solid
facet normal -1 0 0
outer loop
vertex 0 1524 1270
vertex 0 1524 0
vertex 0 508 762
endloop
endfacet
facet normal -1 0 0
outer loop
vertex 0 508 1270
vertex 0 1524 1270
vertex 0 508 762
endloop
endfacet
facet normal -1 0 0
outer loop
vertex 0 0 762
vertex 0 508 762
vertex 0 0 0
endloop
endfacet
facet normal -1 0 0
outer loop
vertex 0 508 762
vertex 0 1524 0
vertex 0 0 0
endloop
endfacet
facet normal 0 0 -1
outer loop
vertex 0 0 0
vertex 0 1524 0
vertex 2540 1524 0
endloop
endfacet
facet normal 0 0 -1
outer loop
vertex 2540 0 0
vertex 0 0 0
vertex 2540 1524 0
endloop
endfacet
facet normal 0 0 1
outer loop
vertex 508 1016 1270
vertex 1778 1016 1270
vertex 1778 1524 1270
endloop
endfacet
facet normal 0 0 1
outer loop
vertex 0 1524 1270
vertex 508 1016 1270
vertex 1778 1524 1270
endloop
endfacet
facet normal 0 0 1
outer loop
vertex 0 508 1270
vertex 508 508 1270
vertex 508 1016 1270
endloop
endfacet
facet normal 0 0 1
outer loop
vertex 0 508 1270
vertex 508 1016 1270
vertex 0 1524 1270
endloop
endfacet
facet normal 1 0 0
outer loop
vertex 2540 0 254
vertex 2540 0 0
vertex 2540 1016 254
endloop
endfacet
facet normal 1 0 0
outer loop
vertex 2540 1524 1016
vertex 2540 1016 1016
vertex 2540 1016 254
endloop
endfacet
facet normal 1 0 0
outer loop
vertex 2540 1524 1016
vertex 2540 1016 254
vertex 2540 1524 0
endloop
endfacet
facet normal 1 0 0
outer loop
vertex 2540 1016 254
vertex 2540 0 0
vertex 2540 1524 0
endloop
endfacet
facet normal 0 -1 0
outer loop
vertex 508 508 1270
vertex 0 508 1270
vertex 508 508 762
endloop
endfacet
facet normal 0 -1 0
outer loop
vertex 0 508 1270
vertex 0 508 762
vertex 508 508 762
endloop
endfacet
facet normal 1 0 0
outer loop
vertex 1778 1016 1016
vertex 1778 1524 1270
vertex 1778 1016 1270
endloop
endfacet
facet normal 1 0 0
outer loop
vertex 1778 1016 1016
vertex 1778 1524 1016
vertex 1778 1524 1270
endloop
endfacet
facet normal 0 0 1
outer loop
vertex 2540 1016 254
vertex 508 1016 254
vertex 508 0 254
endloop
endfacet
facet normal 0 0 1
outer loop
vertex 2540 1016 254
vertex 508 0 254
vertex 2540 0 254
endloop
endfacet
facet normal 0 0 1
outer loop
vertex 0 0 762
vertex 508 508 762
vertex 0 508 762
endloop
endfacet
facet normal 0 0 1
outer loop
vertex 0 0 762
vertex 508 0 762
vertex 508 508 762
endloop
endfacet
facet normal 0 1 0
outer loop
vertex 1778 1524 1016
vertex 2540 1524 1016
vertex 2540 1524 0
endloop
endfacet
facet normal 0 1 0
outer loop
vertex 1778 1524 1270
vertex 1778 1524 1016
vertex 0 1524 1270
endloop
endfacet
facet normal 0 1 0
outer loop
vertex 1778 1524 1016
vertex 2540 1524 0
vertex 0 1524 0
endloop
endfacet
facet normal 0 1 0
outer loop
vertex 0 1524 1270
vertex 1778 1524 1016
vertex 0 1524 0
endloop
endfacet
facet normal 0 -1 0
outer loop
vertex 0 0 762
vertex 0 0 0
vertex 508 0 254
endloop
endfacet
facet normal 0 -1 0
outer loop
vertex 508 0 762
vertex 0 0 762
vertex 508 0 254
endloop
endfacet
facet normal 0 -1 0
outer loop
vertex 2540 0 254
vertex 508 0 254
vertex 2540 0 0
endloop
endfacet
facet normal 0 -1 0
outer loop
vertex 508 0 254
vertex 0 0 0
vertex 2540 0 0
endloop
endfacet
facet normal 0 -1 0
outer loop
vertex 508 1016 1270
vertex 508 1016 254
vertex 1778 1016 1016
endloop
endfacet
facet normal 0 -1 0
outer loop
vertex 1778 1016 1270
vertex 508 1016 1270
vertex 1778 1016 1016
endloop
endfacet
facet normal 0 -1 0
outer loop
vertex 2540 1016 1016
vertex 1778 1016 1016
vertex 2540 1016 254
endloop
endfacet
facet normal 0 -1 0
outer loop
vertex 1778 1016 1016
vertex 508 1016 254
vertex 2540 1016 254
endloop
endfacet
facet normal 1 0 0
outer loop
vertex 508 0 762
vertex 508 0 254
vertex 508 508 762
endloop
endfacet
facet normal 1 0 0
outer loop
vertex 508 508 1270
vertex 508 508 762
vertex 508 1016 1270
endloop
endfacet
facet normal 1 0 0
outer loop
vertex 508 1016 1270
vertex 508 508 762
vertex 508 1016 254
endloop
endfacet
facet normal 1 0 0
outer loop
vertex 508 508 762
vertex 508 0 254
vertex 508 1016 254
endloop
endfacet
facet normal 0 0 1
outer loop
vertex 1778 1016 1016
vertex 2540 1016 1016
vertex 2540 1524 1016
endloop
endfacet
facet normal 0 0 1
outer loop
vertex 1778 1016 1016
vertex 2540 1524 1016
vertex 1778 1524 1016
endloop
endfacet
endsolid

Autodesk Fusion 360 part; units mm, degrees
sketch "Sketch1" plane through (0, 0, 0) normal (0, 0, 1) x (1, 0, 0)
  line L0 (0, 0) -> (2540, 0)
  line L1 (2540, 0) -> (2540, 1524)
  line L2 (2540, 1524) -> (0, 1524)
  line L3 (0, 1524) -> (0, 0)
  line L4 (508, 0) -> (508, 1016)
  line L5 (508, 1016) -> (1778, 1016)
  line L6 (1778, 1016) -> (1778, 1524)
  line L7 (508, 508) -> (0, 508)
  line L8 (1778, 1016) -> (2540, 1016)
  dimension "d1" = 2540
  dimension "d2" = 1524
  dimension "d3" = 508
  dimension "d4" = 508
  dimension "d5" = 508
  dimension "d6" = 762
extrude "Extrude1" add sketch "Sketch1" along normal blind 254
sketch "Sketch2" plane through (0, 0, 254) normal (0, 0, 1) x (-1, 0, 0)
  line L0 (0, -1524) -> (0, 0)
  line L1 (0, 0) -> (-2540, 0)
  line L2 (-2540, 0) -> (-2540, -1524)
  line L3 (-2540, -1524) -> (0, -1524)
  line L4 (-508, 0) -> (-508, -1016)
  line L5 (-508, -1016) -> (-2540, -1016)
  dimension "d9" = 508
  dimension "d10" = 508
extrude "Extrude2" add sketch "Sketch2" along normal blind 508 contours L0 L1 L2 L3 L4 L5
sketch "Sketch3" plane through (0, 0, 762) normal (0, 0, 1) x (-1, 0, 0)
  line L0 (-508, -1016) -> (-2540, -1016)
  line L1 (-2540, -1016) -> (-2540, -1524)
  line L2 (-2540, -1524) -> (0, -1524)
  line L3 (0, -1524) -> (0, 0)
  line L4 (0, 0) -> (-508, 0)
  line L5 (-508, 0) -> (-508, -1016)
  line L6 (-508, -508) -> (0, -508)
  line L7 (-1778, -1016) -> (-1778, -1524)
  dimension "d13" = 762
  dimension "d14" = 508
extrude "Extrude3" add sketch "Sketch3" along normal blind 254 contours L0 L2 L3 L5 L6 L7 | L0 L1 L2 L7
sketch "Sketch4" plane through (0, 0, 1016) normal (0, 0, 1) x (-1, 0, 0)
  line L0 (-508, -1016) -> (-2540, -1016)
  line L1 (-2540, -1016) -> (-2540, -1524)
  line L2 (-2540, -1524) -> (0, -1524)
  line L3 (0, -1524) -> (0, -508)
  line L4 (0, -508) -> (-508, -508)
  line L5 (-508, -508) -> (-508, -1016)
  line L6 (-1778, -1524) -> (-1778, -1016)
  dimension "d17" = 762
extrude "Extrude4" add sketch "Sketch4" along normal blind 254 contours L0 L2 L3 L4 L5 L6
